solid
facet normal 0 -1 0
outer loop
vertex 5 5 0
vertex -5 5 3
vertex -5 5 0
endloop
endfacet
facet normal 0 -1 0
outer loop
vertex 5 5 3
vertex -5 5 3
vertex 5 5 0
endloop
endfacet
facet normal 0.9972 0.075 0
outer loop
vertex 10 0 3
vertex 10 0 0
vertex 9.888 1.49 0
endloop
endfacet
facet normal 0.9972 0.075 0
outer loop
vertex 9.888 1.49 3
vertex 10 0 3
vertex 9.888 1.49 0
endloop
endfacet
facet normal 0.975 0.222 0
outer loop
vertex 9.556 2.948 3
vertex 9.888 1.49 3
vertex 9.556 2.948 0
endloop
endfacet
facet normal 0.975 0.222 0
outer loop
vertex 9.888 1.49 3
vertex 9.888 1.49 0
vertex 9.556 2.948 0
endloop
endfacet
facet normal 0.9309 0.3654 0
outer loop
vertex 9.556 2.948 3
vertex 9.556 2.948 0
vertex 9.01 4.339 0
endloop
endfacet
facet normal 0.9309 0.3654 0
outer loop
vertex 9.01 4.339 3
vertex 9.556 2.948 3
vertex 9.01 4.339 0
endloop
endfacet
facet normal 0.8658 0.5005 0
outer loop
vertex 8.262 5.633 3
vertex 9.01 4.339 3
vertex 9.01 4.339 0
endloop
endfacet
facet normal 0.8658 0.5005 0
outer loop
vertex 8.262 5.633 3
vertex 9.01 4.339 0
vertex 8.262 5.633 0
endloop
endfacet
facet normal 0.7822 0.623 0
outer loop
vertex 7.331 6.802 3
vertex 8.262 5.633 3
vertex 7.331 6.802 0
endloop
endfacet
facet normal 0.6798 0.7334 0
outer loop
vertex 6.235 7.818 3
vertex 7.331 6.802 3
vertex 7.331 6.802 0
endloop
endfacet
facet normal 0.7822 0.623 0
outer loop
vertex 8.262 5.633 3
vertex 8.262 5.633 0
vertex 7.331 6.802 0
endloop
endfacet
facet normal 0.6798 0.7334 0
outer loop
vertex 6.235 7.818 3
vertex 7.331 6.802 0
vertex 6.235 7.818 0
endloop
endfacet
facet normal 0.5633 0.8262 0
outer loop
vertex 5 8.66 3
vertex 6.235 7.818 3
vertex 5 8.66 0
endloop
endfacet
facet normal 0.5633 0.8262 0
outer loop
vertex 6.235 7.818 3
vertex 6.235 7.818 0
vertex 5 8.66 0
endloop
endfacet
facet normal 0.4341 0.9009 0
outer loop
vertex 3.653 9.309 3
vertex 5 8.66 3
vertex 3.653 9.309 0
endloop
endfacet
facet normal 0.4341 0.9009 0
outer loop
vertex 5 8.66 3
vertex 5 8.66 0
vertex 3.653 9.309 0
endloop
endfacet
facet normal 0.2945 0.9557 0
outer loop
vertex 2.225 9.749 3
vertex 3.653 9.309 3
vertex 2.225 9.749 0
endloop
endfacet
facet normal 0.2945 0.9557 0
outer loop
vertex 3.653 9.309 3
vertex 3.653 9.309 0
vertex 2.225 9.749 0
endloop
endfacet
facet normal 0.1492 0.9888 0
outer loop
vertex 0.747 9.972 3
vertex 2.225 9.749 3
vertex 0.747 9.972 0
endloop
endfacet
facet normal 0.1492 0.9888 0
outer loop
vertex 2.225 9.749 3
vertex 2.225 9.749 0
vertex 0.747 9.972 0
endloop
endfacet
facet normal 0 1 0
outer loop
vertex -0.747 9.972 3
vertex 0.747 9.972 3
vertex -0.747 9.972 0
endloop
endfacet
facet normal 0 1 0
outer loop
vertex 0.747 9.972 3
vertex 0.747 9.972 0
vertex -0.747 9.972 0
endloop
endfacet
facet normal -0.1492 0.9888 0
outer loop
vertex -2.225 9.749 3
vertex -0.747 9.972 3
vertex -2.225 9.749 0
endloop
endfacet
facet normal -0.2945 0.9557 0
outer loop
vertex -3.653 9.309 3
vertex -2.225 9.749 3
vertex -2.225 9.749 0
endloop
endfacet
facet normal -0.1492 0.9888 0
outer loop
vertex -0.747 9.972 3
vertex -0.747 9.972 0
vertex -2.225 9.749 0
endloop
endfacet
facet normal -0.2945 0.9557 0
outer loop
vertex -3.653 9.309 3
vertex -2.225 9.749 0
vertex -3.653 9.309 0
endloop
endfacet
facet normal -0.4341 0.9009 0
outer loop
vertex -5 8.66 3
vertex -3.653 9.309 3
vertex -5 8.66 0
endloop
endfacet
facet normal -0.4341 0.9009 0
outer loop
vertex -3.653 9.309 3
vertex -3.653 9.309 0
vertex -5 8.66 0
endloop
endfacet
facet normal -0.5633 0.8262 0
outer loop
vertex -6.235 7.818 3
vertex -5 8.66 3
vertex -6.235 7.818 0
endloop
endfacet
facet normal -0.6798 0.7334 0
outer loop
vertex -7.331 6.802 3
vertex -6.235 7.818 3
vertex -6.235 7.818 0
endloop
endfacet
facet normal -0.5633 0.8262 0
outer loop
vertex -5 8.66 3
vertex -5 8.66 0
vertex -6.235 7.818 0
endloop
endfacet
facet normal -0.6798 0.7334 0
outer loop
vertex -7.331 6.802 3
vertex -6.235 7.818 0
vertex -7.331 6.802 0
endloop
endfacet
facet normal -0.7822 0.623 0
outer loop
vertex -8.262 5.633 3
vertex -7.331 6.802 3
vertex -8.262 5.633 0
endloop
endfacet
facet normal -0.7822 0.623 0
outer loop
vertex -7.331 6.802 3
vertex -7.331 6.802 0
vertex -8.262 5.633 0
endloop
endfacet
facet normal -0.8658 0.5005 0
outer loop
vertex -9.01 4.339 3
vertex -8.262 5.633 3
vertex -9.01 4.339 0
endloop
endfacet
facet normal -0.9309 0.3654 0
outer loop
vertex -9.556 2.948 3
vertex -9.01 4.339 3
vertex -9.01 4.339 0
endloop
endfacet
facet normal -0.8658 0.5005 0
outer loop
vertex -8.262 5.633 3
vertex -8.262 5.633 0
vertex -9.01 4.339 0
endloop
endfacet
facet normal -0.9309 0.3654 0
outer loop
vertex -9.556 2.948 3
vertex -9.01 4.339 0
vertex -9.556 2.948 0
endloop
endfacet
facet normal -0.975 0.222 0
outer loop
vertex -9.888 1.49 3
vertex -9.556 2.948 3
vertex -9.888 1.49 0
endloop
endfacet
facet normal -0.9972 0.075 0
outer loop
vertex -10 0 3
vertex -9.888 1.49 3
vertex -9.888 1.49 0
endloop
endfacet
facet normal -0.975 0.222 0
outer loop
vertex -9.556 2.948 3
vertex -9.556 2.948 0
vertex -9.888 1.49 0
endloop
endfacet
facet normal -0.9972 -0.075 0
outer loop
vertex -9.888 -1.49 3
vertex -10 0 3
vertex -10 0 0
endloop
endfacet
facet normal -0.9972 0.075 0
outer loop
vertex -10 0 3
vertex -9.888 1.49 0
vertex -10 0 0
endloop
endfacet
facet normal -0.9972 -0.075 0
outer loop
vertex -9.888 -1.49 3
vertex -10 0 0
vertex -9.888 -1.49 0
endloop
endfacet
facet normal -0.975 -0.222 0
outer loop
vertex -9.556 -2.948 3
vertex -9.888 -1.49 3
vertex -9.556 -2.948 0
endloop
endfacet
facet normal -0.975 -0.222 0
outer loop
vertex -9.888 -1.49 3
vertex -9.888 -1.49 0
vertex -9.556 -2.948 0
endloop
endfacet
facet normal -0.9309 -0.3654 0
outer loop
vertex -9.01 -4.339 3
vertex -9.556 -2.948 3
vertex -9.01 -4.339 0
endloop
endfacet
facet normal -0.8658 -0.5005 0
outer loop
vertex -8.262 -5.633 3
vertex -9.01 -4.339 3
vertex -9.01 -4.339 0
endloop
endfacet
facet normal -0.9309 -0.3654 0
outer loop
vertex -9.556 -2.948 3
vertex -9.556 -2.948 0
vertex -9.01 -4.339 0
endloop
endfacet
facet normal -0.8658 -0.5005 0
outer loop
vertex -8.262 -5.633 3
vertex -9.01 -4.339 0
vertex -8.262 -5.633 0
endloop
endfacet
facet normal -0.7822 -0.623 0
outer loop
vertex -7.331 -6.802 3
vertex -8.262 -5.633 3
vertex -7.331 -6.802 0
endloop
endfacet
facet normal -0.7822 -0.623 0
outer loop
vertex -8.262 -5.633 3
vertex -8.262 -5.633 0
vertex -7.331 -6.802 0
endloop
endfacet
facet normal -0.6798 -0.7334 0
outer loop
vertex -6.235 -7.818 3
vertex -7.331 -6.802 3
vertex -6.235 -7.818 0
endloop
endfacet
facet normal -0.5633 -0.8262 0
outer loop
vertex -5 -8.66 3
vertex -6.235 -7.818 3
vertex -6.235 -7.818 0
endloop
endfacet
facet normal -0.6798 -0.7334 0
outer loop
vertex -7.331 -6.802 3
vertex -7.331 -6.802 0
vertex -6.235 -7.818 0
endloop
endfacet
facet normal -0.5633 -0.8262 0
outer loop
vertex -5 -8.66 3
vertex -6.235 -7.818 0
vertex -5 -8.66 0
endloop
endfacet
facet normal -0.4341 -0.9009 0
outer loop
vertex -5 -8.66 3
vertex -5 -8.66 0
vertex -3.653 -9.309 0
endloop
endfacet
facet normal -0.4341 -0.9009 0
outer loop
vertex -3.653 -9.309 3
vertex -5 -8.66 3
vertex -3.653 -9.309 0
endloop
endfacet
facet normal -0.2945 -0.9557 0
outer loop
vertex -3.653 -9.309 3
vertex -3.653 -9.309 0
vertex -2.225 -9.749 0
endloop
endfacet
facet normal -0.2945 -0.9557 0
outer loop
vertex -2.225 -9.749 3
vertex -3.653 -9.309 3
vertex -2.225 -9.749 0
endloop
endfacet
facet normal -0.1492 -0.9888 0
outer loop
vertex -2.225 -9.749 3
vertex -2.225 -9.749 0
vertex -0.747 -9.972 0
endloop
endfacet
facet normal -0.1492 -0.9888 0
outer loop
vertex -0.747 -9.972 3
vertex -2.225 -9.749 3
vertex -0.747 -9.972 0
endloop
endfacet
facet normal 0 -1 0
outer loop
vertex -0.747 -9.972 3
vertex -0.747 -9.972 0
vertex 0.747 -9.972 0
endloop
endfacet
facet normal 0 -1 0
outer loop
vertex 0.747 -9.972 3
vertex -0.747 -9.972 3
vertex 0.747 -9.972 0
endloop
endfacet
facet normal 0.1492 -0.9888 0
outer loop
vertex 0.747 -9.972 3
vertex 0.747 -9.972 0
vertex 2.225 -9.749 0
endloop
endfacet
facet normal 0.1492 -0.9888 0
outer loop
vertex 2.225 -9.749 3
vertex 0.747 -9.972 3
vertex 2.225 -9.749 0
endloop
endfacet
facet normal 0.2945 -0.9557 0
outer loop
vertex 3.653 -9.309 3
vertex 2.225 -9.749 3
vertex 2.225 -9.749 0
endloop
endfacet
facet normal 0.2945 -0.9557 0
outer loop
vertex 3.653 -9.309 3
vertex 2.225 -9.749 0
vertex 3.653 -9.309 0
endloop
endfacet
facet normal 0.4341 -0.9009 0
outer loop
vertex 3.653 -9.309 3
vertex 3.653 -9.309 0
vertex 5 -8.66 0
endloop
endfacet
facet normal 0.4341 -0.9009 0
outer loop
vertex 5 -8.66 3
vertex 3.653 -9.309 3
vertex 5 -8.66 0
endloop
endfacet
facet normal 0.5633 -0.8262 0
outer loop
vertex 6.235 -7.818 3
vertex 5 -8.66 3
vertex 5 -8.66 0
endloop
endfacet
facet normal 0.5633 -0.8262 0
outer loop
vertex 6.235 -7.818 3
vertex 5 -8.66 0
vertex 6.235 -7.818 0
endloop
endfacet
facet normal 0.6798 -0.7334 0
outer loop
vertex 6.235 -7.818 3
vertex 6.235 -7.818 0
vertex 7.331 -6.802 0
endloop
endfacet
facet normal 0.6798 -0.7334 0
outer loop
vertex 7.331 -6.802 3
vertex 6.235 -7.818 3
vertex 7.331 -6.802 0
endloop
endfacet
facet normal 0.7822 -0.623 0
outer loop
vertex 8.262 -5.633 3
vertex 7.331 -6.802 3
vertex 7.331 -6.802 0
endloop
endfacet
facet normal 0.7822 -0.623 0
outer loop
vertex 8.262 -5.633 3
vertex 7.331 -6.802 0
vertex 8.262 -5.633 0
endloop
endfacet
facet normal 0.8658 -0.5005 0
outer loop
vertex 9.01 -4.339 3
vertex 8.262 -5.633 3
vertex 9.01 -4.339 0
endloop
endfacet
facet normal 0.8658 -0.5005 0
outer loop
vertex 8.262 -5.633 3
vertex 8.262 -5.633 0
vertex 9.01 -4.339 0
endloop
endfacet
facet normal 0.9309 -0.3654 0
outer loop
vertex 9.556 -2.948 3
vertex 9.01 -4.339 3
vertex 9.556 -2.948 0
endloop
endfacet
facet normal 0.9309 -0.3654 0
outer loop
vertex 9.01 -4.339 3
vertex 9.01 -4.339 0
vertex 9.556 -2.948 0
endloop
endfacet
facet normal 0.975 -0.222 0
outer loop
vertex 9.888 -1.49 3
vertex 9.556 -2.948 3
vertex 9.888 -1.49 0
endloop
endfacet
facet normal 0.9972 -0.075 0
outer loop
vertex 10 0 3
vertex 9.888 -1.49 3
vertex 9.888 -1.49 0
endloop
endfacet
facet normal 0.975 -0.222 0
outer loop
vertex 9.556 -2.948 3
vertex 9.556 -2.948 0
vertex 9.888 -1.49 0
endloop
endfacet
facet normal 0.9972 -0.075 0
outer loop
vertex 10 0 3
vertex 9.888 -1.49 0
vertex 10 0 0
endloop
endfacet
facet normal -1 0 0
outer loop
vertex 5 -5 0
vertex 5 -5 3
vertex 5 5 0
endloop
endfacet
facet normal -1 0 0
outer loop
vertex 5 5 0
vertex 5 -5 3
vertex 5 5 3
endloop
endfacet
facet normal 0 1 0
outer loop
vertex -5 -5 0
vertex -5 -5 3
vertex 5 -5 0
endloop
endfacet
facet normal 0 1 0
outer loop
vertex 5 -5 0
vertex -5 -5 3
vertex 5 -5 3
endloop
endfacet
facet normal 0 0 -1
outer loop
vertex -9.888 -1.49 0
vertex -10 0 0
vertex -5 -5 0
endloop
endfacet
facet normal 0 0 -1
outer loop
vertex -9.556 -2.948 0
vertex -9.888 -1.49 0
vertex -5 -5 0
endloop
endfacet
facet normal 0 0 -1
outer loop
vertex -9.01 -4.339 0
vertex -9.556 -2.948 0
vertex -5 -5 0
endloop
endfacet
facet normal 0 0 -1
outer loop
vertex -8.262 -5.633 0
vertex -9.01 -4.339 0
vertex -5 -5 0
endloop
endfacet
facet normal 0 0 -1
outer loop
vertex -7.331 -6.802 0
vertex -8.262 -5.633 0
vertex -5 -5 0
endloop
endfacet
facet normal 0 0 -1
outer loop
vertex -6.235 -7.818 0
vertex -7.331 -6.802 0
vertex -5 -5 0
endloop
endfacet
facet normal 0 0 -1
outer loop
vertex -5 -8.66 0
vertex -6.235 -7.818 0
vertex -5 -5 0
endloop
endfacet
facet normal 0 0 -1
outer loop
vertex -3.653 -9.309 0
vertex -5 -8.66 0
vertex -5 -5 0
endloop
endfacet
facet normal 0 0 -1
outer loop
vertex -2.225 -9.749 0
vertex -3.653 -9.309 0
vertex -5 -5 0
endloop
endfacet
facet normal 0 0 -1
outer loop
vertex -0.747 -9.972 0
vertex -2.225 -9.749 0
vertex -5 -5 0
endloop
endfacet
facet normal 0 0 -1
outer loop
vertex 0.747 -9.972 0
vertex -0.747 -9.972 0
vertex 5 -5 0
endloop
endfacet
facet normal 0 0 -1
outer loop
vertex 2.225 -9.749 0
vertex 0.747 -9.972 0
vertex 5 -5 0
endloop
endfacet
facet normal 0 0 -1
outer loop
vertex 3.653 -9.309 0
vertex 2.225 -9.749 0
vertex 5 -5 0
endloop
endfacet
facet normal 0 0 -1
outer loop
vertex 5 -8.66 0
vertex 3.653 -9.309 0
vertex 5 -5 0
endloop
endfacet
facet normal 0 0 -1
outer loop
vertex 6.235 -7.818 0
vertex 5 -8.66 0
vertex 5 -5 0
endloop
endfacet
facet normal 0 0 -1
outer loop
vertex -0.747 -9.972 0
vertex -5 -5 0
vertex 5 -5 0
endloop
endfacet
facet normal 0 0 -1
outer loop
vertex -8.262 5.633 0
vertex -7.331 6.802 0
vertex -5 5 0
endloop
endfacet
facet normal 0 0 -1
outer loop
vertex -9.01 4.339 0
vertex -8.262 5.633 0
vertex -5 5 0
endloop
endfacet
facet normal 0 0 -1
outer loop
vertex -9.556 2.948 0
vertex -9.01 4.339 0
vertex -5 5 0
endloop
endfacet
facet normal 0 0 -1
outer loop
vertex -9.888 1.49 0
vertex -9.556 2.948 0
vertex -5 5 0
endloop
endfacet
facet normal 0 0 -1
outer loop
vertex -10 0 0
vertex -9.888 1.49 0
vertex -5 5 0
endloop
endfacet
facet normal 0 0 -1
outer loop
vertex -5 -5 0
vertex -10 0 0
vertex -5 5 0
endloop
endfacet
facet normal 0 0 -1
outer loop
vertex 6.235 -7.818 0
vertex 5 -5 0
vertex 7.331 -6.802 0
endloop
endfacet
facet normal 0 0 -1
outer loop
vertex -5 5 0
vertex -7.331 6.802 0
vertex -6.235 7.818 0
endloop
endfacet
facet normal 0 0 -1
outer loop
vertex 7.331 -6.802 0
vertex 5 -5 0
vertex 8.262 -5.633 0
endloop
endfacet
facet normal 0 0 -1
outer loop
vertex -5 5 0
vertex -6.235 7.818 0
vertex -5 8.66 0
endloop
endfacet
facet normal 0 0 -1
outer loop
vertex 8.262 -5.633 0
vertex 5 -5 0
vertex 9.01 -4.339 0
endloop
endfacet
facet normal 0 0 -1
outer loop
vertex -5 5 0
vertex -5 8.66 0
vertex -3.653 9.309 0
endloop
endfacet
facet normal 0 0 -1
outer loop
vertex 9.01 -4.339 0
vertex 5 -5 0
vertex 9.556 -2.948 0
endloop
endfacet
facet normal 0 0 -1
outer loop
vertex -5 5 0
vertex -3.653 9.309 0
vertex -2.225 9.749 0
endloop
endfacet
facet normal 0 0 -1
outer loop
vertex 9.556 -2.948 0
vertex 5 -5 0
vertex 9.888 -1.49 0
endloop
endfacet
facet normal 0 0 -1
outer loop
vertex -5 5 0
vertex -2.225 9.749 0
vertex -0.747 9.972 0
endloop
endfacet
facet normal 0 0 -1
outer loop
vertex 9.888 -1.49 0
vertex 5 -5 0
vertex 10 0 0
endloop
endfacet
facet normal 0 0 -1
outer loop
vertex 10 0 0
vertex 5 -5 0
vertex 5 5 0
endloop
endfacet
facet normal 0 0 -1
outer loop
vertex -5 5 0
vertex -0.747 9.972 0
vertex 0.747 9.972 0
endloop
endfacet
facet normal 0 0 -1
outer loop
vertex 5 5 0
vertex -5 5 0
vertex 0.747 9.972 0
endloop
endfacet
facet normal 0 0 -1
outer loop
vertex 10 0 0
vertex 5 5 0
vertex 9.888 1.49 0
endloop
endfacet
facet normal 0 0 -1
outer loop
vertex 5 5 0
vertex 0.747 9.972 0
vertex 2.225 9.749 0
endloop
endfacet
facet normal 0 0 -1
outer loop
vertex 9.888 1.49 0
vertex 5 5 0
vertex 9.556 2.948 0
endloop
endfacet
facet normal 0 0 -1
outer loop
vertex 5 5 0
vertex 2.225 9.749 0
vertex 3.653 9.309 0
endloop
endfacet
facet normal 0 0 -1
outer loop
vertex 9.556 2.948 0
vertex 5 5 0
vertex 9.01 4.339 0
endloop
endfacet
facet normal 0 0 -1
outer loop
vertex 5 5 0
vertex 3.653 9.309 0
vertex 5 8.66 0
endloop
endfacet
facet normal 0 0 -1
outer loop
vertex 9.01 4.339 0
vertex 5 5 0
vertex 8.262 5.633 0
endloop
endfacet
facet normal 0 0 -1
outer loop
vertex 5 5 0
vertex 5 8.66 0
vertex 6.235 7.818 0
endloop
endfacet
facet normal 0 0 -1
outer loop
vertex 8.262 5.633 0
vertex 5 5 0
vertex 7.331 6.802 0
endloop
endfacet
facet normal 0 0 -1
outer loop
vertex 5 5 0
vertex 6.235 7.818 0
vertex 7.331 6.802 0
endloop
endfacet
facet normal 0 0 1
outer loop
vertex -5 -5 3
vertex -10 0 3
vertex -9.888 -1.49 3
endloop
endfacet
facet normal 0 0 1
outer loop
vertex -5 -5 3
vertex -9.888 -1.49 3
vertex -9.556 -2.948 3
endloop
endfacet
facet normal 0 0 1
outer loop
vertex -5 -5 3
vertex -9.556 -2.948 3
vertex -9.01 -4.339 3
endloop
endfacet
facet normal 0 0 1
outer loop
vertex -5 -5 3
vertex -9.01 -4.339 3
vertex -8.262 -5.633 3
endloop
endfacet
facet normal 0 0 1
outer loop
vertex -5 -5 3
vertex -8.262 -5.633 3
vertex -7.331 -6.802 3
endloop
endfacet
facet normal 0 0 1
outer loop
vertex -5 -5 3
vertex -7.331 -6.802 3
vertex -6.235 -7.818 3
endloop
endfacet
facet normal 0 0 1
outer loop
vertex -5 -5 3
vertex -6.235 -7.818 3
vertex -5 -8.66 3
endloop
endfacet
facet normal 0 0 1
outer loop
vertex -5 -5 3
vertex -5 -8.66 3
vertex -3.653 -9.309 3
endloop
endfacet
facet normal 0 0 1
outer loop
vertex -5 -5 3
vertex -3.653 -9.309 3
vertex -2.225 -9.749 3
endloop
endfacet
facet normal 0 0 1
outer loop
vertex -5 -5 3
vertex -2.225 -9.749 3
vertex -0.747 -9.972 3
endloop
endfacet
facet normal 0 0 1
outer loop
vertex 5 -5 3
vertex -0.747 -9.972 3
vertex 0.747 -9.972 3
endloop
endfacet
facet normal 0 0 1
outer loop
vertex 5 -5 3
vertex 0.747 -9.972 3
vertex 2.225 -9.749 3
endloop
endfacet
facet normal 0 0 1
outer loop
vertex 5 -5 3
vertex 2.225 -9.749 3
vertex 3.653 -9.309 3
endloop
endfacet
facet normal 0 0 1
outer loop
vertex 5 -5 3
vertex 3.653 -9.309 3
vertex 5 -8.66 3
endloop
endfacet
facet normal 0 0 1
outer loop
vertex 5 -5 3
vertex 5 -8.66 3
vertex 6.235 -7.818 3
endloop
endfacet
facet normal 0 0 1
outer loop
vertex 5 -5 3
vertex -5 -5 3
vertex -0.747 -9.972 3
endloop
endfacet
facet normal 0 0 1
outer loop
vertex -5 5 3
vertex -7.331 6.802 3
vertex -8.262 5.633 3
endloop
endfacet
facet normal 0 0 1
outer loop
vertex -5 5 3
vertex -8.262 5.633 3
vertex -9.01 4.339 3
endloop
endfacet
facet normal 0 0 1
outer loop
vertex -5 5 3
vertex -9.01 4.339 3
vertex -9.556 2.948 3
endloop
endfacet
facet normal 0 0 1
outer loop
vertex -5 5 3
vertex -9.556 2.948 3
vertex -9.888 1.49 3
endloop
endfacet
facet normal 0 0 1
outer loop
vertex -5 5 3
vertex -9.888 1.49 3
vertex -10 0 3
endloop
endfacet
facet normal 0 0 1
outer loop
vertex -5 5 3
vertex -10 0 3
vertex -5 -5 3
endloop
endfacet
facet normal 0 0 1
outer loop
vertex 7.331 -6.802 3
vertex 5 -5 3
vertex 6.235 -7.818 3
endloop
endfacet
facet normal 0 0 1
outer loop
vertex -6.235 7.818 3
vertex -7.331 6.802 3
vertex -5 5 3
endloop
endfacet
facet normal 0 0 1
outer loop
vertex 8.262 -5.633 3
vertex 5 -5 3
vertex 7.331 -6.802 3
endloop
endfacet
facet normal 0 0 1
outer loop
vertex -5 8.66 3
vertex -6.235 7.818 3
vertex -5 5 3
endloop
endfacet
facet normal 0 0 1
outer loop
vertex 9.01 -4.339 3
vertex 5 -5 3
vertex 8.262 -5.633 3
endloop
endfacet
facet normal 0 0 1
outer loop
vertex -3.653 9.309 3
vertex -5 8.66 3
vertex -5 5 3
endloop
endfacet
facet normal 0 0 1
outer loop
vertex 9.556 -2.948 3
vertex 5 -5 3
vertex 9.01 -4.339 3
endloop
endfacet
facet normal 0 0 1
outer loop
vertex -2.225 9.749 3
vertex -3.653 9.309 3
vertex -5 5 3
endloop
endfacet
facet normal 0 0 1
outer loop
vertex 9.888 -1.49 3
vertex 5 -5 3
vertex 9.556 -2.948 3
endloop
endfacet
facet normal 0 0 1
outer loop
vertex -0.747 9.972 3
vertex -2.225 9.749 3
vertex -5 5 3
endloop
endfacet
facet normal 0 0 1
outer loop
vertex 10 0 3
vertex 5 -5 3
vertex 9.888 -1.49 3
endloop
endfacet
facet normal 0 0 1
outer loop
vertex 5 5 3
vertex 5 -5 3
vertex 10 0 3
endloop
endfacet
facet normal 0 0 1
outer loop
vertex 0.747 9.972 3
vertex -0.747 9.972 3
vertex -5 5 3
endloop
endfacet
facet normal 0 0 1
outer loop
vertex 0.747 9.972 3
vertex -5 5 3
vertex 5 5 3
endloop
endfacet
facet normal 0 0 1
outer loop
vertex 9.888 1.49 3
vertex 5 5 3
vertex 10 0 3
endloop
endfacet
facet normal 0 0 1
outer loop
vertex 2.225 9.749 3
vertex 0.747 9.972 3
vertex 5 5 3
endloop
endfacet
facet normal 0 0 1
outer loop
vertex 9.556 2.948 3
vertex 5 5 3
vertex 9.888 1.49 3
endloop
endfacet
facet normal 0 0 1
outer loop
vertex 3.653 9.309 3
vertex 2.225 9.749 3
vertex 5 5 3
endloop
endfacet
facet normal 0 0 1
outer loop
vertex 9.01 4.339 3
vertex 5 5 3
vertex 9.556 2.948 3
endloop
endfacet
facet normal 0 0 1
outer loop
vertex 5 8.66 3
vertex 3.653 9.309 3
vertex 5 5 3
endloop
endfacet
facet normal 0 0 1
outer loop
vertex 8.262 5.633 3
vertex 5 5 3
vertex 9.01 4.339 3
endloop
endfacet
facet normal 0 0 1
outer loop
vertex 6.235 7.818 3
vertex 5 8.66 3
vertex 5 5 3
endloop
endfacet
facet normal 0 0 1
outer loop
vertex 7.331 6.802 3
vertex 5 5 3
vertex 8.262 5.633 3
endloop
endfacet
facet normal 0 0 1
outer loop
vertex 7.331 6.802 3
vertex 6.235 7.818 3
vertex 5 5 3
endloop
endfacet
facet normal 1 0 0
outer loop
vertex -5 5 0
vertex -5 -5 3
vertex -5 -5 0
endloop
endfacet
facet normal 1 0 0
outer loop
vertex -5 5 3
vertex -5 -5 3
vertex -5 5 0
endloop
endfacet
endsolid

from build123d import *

# Parameters (mm, degrees)
F0_R     = 10
F1_DEPTH = 3
F2_W     = 10
F2_H     = 10
F3_DEPTH = 3.001


with BuildPart() as f1:
    # F0 (on Top) → F1 (new body)
    with BuildSketch(Plane.XY):
        Circle(F0_R)
    extrude(amount=F1_DEPTH)

    # F2 (on face) → F3 (cut, through all)
    with BuildSketch(Plane.XY.offset(3)):
        Rectangle(F2_W, F2_H)
    extrude(amount=-F3_DEPTH, mode=Mode.SUBTRACT)


solid = f1.part
